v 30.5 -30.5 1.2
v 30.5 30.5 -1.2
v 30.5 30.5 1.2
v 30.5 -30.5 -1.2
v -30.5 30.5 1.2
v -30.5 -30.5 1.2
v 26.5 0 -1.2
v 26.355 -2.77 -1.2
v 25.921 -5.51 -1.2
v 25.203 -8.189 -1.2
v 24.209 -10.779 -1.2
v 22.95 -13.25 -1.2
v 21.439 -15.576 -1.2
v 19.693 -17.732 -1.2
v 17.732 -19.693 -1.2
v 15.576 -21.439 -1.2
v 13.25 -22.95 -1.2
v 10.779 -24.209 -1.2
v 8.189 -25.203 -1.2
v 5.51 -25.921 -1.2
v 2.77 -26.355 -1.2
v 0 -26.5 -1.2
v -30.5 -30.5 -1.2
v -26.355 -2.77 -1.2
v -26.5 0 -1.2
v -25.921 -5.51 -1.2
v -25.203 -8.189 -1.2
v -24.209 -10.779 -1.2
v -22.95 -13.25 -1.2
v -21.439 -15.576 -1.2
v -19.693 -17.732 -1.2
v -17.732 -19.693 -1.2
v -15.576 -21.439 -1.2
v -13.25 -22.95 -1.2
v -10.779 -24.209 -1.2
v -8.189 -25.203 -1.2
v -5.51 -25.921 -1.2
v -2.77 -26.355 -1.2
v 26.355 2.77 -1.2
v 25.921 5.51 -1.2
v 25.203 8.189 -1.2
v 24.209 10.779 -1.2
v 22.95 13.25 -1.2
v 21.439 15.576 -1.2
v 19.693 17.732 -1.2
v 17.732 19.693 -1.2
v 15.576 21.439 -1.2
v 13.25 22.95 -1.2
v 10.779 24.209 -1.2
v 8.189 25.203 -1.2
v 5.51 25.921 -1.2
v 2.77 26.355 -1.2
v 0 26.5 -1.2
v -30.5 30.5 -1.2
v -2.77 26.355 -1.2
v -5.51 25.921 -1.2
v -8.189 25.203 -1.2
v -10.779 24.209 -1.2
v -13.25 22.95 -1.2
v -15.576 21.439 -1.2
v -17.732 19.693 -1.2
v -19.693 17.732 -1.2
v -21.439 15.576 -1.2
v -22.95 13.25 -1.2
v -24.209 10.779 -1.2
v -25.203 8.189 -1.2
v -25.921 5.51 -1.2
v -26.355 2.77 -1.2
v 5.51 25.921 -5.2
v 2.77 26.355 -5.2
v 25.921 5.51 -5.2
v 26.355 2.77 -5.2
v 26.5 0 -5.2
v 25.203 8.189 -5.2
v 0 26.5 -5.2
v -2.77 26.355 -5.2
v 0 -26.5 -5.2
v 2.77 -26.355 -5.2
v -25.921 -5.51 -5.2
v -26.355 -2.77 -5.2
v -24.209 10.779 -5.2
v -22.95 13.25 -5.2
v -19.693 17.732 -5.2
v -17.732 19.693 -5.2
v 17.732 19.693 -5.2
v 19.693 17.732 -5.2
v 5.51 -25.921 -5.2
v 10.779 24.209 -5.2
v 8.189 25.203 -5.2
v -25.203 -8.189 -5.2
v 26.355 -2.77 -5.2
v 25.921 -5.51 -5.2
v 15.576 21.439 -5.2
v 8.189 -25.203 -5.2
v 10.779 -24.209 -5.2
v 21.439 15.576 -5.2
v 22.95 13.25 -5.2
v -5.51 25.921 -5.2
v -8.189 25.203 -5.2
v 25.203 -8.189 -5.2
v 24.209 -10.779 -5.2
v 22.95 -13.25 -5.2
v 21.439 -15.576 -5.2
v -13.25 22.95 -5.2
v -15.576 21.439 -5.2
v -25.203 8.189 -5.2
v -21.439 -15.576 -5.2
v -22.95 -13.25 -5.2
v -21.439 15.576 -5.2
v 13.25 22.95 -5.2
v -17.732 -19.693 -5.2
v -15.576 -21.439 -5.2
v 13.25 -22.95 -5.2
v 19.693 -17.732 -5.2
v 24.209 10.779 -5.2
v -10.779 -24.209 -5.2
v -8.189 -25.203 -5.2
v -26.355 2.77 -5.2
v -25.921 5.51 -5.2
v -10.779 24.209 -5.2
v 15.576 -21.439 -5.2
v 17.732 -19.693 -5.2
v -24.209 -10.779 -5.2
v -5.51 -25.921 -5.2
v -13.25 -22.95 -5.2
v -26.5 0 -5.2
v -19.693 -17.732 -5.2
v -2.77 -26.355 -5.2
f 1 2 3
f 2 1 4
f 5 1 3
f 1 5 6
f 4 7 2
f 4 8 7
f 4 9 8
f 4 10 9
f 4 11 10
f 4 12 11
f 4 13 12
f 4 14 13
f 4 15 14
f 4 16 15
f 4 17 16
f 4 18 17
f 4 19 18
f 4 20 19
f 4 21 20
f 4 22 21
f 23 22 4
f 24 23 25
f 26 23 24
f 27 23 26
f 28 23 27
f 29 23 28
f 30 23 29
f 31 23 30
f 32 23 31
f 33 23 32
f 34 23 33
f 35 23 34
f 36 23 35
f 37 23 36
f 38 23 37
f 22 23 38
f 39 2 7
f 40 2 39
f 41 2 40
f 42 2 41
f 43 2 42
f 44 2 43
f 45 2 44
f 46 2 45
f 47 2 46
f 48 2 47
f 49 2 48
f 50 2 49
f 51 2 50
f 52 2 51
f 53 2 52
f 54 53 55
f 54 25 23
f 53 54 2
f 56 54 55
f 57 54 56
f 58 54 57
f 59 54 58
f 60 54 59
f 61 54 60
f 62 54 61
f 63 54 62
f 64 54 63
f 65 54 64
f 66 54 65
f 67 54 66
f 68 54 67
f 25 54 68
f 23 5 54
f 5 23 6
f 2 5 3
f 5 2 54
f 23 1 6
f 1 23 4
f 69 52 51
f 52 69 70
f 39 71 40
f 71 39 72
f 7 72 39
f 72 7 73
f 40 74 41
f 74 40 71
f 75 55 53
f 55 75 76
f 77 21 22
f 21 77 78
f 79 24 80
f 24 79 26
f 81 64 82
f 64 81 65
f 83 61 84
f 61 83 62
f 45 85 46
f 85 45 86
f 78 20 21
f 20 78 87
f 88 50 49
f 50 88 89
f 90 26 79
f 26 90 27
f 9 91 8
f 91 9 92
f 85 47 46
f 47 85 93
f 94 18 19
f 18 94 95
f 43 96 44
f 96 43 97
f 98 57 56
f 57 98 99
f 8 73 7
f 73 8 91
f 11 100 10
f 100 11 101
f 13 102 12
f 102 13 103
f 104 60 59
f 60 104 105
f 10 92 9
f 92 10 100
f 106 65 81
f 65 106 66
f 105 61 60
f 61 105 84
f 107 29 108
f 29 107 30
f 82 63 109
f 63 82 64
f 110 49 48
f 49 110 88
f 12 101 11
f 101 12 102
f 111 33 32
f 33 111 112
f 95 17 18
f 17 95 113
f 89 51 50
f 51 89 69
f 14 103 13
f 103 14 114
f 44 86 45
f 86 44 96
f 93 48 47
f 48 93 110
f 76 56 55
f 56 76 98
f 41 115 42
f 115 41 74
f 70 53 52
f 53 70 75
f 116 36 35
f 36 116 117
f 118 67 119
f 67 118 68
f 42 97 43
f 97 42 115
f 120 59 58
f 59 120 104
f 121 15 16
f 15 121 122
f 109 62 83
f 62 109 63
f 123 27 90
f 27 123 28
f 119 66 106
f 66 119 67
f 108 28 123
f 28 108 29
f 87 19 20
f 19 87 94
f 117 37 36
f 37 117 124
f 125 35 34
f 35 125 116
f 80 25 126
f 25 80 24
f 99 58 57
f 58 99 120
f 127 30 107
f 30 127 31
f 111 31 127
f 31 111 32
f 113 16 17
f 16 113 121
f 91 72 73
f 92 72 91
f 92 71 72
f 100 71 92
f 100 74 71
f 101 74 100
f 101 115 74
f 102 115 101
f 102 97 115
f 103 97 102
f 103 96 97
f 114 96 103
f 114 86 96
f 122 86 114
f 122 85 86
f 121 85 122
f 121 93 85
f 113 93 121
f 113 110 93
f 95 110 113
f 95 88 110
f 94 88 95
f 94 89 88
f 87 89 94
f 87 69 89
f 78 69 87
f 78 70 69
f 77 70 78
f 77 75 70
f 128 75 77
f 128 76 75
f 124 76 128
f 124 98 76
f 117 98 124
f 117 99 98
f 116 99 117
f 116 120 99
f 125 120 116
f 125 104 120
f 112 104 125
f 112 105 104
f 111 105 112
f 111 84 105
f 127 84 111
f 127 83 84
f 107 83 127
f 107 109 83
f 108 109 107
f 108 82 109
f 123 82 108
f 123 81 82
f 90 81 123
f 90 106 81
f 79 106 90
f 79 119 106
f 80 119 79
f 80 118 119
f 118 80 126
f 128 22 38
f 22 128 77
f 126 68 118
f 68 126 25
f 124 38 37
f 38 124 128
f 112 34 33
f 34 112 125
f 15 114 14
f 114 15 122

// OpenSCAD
// Press-fit end cap for 60 mm extrusion.
$fn = 60;
eps = 0.02;
profile = 60;
cap_t = 2.4;
wall = 3.5;
pin_d = profile - 2 * wall;
pin_l = 4;
union() {
    cube([profile + 1, profile + 1, cap_t], center = true);
    translate([0, 0, -cap_t / 2 - pin_l]) cylinder(d = pin_d, h = pin_l + eps);
}
